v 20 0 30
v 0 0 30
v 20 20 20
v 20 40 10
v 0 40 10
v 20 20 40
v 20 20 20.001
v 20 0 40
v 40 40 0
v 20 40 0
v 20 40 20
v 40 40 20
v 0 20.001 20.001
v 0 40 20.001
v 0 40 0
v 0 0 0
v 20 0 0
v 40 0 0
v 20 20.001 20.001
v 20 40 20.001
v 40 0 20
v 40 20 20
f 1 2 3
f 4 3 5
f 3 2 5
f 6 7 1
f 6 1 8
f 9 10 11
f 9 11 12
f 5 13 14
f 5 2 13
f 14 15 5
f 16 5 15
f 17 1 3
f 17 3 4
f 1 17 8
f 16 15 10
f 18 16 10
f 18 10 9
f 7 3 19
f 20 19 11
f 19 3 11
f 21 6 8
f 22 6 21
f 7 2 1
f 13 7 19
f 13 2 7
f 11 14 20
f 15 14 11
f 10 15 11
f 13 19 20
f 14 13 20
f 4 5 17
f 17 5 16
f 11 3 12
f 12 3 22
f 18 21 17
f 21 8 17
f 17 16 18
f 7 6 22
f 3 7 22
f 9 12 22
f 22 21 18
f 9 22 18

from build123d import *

# Parameters (mm, degrees)
SKETCH1_W           = 40
SKETCH1_H           = 40
BOSS_EXTRUDE1_DEPTH = 40
SKETCH2_W           = 20
SKETCH2_H           = 10
CUT_EXTRUDE1_DEPTH  = 40
SKETCH3_W           = 20
SKETCH3_H           = 20
CUT_EXTRUDE2_DEPTH  = 40
SKETCH5_W           = 20
SKETCH5_H           = 20
CUT_EXTRUDE3_DEPTH  = 10
SKETCH7_W           = 20
SKETCH7_H           = 20
BOSS_EXTRUDE2_DEPTH = 10
SKETCH8_W           = 20
SKETCH8_H           = 20
BOSS_EXTRUDE3_DEPTH = 10
CUT_EXTRUDE10_DEPTH = 27
CUT_EXTRUDE12_DEPTH = 20
SKETCH12_W          = 20
SKETCH12_H          = 20
BOSS_EXTRUDE4_DEPTH = 0.0001
SKETCH14_W          = 9.999
SKETCH14_H          = 19.999
CUT_EXTRUDE19_DEPTH = 20.0001
CUT_EXTRUDE20_DEPTH = 20.0001
CUT_EXTRUDE21_DEPTH = 0.0001


with BuildPart() as part:
    # Sketch1 → Boss-Extrude1 (new body)
    with BuildSketch(Plane.XY):
        with Locations((20, 20)):
            Rectangle(SKETCH1_W, SKETCH1_H)
    extrude(amount=BOSS_EXTRUDE1_DEPTH)

    # Sketch2 → Cut-Extrude1 (cut)
    with BuildSketch(Plane(origin=(0, 40, 0), x_dir=(1, 0, 0), z_dir=(0, 1, 0))):
        with Locations((10, -35)):
            Rectangle(SKETCH2_W, SKETCH2_H)
    extrude(amount=-CUT_EXTRUDE1_DEPTH, mode=Mode.SUBTRACT)

    # Sketch3 → Cut-Extrude2 (cut)
    with BuildSketch(Plane.ZY):
        with Locations((30, 30)):
            Rectangle(SKETCH3_W, SKETCH3_H)
    extrude(amount=-CUT_EXTRUDE2_DEPTH, mode=Mode.SUBTRACT)

    # Sketch5 → Cut-Extrude3 (cut)
    with BuildSketch(Plane(origin=(40, 0, 0), x_dir=(0, 0, -1), z_dir=(1, 0, 0))):
        with Locations((-30, 10)):
            Rectangle(SKETCH5_W, SKETCH5_H)
    extrude(amount=-CUT_EXTRUDE3_DEPTH, mode=Mode.SUBTRACT)

    # Sketch7 → Boss-Extrude2 (add)
    with BuildSketch(Plane.XY.offset(20)):
        with Locations((10, 30)):
            Rectangle(SKETCH7_W, SKETCH7_H)
    extrude(amount=BOSS_EXTRUDE2_DEPTH)

    # Sketch8 → Boss-Extrude3 (add)
    with BuildSketch(Plane(origin=(30, 0, 0), x_dir=(0, 0, -1), z_dir=(1, 0, 0))):
        with Locations((-30, 10)):
            Rectangle(SKETCH8_W, SKETCH8_H)
    extrude(amount=BOSS_EXTRUDE3_DEPTH)

    # Sketch10 → Cut-Extrude10 (cut)
    with BuildSketch(Plane(origin=(0, 20, 0), x_dir=(1, 0, 0), z_dir=(0, 1, 0))):
        Polygon((20, -40), (40, -20), (40, -40), align=None)
    extrude(amount=-CUT_EXTRUDE10_DEPTH, mode=Mode.SUBTRACT)

    # Sketch11 → Cut-Extrude12 (cut)
    with BuildSketch(Plane.ZY):
        Polygon((10.0001, 39.9999), (0.0001, 0), (30.0001, 0), align=None)
    extrude(amount=-CUT_EXTRUDE12_DEPTH, mode=Mode.SUBTRACT)

    # Sketch12 → Boss-Extrude4 (add)
    with BuildSketch(Plane(origin=(0, 40, 0), x_dir=(1, 0, 0), z_dir=(0, 1, 0))):
        with Locations((30, -10)):
            Rectangle(SKETCH12_W, SKETCH12_H)
    extrude(amount=BOSS_EXTRUDE4_DEPTH)

    # Sketch14 → Cut-Extrude19 (cut)
    with BuildSketch(Plane.ZY):
        with Locations((25.0005, 30.0005)):
            Rectangle(SKETCH14_W, SKETCH14_H)
    extrude(amount=-CUT_EXTRUDE19_DEPTH, mode=Mode.SUBTRACT)

    # Sketch15 → Cut-Extrude20 (cut)
    with BuildSketch(Plane.ZY):
        Polygon((20.001, 20.001), (30, 20.001), (30, 0.0002), align=None)
    extrude(amount=-CUT_EXTRUDE20_DEPTH, mode=Mode.SUBTRACT)

    # Sketch16 → Cut-Extrude21 (cut)
    with BuildSketch(Plane.ZY.offset(-20)):
        Polygon((40, 20), (20.001, 20.001), (30, 0.0002), (40, 0), align=None)
    extrude(amount=-CUT_EXTRUDE21_DEPTH, mode=Mode.SUBTRACT)


solid = part.part
